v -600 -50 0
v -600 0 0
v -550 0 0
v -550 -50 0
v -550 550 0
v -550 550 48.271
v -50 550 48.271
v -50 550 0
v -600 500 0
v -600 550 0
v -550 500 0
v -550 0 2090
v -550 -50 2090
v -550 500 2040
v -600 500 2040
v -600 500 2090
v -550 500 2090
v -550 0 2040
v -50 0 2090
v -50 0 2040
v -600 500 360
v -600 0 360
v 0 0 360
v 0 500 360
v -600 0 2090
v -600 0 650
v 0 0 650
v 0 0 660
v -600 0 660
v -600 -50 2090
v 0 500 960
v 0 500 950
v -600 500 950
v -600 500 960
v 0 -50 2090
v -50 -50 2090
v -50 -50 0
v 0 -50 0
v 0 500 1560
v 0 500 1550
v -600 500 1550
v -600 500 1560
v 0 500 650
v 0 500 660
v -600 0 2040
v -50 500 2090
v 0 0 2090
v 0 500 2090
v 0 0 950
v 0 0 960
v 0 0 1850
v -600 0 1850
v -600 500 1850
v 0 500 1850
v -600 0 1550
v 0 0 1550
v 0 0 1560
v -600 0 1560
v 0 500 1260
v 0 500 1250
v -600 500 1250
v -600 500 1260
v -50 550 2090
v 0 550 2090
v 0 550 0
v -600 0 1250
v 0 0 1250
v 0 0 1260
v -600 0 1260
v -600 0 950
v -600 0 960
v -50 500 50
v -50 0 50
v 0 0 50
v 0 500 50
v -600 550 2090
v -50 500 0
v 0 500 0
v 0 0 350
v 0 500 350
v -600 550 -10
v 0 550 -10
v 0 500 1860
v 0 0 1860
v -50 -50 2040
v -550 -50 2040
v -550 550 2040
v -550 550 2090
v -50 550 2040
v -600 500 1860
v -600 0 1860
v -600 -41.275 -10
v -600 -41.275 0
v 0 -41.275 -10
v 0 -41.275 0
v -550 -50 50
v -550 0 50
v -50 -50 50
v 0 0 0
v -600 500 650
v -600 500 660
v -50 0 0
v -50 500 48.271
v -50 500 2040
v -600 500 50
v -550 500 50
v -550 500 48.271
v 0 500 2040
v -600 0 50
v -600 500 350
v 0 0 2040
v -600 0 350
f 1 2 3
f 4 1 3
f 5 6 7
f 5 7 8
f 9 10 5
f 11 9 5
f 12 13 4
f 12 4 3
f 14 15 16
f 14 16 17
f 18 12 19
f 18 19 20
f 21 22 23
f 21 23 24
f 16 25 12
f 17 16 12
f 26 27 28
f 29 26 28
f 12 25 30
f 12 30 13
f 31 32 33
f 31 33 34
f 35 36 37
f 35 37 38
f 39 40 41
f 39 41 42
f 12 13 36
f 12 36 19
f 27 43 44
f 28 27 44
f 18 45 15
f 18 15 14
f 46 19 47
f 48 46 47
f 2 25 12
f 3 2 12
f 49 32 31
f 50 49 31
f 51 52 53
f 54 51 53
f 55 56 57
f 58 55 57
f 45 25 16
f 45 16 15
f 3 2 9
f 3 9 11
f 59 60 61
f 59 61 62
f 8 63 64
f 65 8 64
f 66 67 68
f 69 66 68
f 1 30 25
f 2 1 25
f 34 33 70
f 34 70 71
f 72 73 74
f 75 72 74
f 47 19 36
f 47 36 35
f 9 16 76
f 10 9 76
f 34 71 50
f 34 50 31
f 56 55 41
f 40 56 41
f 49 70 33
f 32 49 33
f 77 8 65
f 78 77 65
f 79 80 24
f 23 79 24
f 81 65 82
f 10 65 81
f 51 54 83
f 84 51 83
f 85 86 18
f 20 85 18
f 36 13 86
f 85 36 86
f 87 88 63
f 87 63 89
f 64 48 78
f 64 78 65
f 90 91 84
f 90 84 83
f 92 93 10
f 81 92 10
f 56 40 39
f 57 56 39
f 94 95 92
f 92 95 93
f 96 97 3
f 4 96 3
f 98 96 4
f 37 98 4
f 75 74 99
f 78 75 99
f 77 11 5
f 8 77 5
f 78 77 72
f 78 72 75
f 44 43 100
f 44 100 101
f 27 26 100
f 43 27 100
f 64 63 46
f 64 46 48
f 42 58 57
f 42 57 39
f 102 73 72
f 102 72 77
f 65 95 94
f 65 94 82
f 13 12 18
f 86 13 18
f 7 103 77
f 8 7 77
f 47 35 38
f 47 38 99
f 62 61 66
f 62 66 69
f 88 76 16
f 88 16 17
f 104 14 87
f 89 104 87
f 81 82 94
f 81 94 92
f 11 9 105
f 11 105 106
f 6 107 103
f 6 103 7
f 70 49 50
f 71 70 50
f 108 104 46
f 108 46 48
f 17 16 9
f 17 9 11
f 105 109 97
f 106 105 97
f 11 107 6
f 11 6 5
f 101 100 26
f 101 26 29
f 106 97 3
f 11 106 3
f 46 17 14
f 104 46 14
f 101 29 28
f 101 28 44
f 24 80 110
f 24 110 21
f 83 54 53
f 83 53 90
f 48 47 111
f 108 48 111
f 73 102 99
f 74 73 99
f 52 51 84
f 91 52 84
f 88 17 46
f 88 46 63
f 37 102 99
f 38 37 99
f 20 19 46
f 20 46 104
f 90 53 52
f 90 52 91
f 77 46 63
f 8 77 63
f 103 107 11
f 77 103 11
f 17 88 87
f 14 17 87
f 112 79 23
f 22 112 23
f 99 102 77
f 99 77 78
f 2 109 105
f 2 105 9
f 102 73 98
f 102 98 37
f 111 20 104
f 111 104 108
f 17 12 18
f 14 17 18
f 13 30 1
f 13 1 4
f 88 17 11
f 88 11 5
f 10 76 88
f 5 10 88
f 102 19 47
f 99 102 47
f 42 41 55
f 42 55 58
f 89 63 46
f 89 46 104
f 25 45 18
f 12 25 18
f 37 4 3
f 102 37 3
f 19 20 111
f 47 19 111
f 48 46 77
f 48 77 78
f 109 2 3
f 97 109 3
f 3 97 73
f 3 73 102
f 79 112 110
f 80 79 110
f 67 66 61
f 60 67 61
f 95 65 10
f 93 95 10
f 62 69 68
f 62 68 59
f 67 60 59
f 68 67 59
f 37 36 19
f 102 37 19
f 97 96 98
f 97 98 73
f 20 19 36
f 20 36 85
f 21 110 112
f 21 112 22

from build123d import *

# Parameters (mm, degrees)
SKETCH1_W             = 50
SKETCH1_H             = 50
BOSS_EXTRUDE1_DEPTH   = 2090
BOSS_EXTRUDE1_2_DEPTH = 2090
BOSS_EXTRUDE1_3_DEPTH = 2090
BOSS_EXTRUDE1_4_DEPTH = 2090
SKETCH2_W             = 50
SKETCH2_H             = 50
BOSS_EXTRUDE2_DEPTH   = 500
BOSS_EXTRUDE2_2_DEPTH = 500
BOSS_EXTRUDE2_3_DEPTH = 500
BOSS_EXTRUDE2_4_DEPTH = 500
SKETCH3_W             = 50
SKETCH3_H             = 50
BOSS_EXTRUDE3_DEPTH   = 500
BOSS_EXTRUDE3_2_DEPTH = 500
SKETCH3_W_2           = 48.270716069
BOSS_EXTRUDE3_3_DEPTH = 500
BOSS_EXTRUDE3_4_DEPTH = 500
SKETCH5_W             = 10
SKETCH5_H             = 500
BOSS_EXTRUDE4_DEPTH   = 600
BOSS_EXTRUDE4_2_DEPTH = 600
BOSS_EXTRUDE4_3_DEPTH = 600
BOSS_EXTRUDE4_4_DEPTH = 600
BOSS_EXTRUDE4_5_DEPTH = 600
BOSS_EXTRUDE4_6_DEPTH = 600
SKETCH6_W             = 600
SKETCH6_H             = 591.274599244
BOSS_EXTRUDE5_DEPTH   = 10


with BuildPart() as part:
    # Sketch1 → Boss-Extrude1 (new body)
    with BuildSketch(Plane.XY):
        with Locations((-575, 525)):
            Rectangle(SKETCH1_W, SKETCH1_H)
    extrude(amount=BOSS_EXTRUDE1_DEPTH)


with BuildPart() as body_2:
    # Sketch1 → Boss-Extrude1 2 (new body)
    with BuildSketch(Plane.XY):
        with Locations((-25, -25)):
            Rectangle(SKETCH1_W, SKETCH1_H)
    extrude(amount=BOSS_EXTRUDE1_2_DEPTH)


with BuildPart() as body_3:
    # Sketch1 → Boss-Extrude1 3 (new body)
    with BuildSketch(Plane.XY):
        with Locations((-575, -25)):
            Rectangle(SKETCH1_W, SKETCH1_H)
    extrude(amount=BOSS_EXTRUDE1_3_DEPTH)


with BuildPart() as body_4:
    # Sketch1 → Boss-Extrude1 4 (new body)
    with BuildSketch(Plane.XY):
        with Locations((-25, 525)):
            Rectangle(SKETCH1_W, SKETCH1_H)
    extrude(amount=BOSS_EXTRUDE1_4_DEPTH)


with BuildPart() as body_5:
    # Sketch2 → Boss-Extrude2 (new body)
    with BuildSketch(Plane(origin=(0, 0, 0), x_dir=(1, 0, 0), z_dir=(0, 1, 0))):
        with Locations((-575, -25)):
            Rectangle(SKETCH2_W, SKETCH2_H)
    extrude(amount=BOSS_EXTRUDE2_DEPTH)


with BuildPart() as body_6:
    # Sketch2 → Boss-Extrude2 2 (new body)
    with BuildSketch(Plane(origin=(0, 0, 0), x_dir=(1, 0, 0), z_dir=(0, 1, 0))):
        with Locations((-25, -25)):
            Rectangle(SKETCH2_W, SKETCH2_H)
    extrude(amount=BOSS_EXTRUDE2_2_DEPTH)


with BuildPart() as body_7:
    # Sketch2 → Boss-Extrude2 3 (new body)
    with BuildSketch(Plane(origin=(0, 0, 0), x_dir=(1, 0, 0), z_dir=(0, 1, 0))):
        with Locations((-575, -2065)):
            Rectangle(SKETCH2_W, SKETCH2_H)
    extrude(amount=BOSS_EXTRUDE2_3_DEPTH)


with BuildPart() as body_8:
    # Sketch2 → Boss-Extrude2 4 (new body)
    with BuildSketch(Plane(origin=(0, 0, 0), x_dir=(1, 0, 0), z_dir=(0, 1, 0))):
        with Locations((-25, -2065)):
            Rectangle(SKETCH2_W, SKETCH2_H)
    extrude(amount=BOSS_EXTRUDE2_4_DEPTH)


with BuildPart() as body_9:
    # Sketch3 → Boss-Extrude3 (new body)
    with BuildSketch(Plane(origin=(-550, 0, 0), x_dir=(0, 0, -1), z_dir=(1, 0, 0))):
        with Locations((-2065, 525)):
            Rectangle(SKETCH3_W, SKETCH3_H)
    extrude(amount=BOSS_EXTRUDE3_DEPTH)


with BuildPart() as body_10:
    # Sketch3 → Boss-Extrude3 2 (new body)
    with BuildSketch(Plane(origin=(-550, 0, 0), x_dir=(0, 0, -1), z_dir=(1, 0, 0))):
        with Locations((-2065, -25)):
            Rectangle(SKETCH3_W, SKETCH3_H)
    extrude(amount=BOSS_EXTRUDE3_2_DEPTH)


with BuildPart() as body_11:
    # Sketch3 → Boss-Extrude3 3 (new body)
    with BuildSketch(Plane(origin=(-550, 0, 0), x_dir=(0, 0, -1), z_dir=(1, 0, 0))):
        with Locations((-24.135358035, 525)):
            Rectangle(SKETCH3_W_2, SKETCH3_H)
    extrude(amount=BOSS_EXTRUDE3_3_DEPTH)


with BuildPart() as body_12:
    # Sketch3 → Boss-Extrude3 4 (new body)
    with BuildSketch(Plane(origin=(-550, 0, 0), x_dir=(0, 0, -1), z_dir=(1, 0, 0))):
        with Locations((-25, -25)):
            Rectangle(SKETCH3_W, SKETCH3_H)
    extrude(amount=BOSS_EXTRUDE3_4_DEPTH)


with BuildPart() as body_13:
    # Sketch5 → Boss-Extrude4 (new body)
    with BuildSketch(Plane.ZY.offset(600)):
        with Locations((355, 250)):
            Rectangle(SKETCH5_W, SKETCH5_H)
    extrude(amount=-BOSS_EXTRUDE4_DEPTH)


with BuildPart() as body_14:
    # Sketch5 → Boss-Extrude4 2 (new body)
    with BuildSketch(Plane.ZY.offset(600)):
        with Locations((655, 250)):
            Rectangle(SKETCH5_W, SKETCH5_H)
    extrude(amount=-BOSS_EXTRUDE4_2_DEPTH)


with BuildPart() as body_15:
    # Sketch5 → Boss-Extrude4 3 (new body)
    with BuildSketch(Plane.ZY.offset(600)):
        with Locations((955, 250)):
            Rectangle(SKETCH5_W, SKETCH5_H)
    extrude(amount=-BOSS_EXTRUDE4_3_DEPTH)


with BuildPart() as body_16:
    # Sketch5 → Boss-Extrude4 4 (new body)
    with BuildSketch(Plane.ZY.offset(600)):
        with Locations((1255, 250)):
            Rectangle(SKETCH5_W, SKETCH5_H)
    extrude(amount=-BOSS_EXTRUDE4_4_DEPTH)


with BuildPart() as body_17:
    # Sketch5 → Boss-Extrude4 5 (new body)
    with BuildSketch(Plane.ZY.offset(600)):
        with Locations((1555, 250)):
            Rectangle(SKETCH5_W, SKETCH5_H)
    extrude(amount=-BOSS_EXTRUDE4_5_DEPTH)


with BuildPart() as body_18:
    # Sketch5 → Boss-Extrude4 6 (new body)
    with BuildSketch(Plane.ZY.offset(600)):
        with Locations((1855, 250)):
            Rectangle(SKETCH5_W, SKETCH5_H)
    extrude(amount=-BOSS_EXTRUDE4_6_DEPTH)


with BuildPart() as body_19:
    # Sketch6 → Boss-Extrude5 (new body)
    with BuildSketch(Plane(origin=(0, 0, 0), x_dir=(-1, 0, 0), z_dir=(0, 0, -1))):
        with Locations((300, 254.362700378)):
            Rectangle(SKETCH6_W, SKETCH6_H)
    extrude(amount=BOSS_EXTRUDE5_DEPTH)


solid = Compound([part.part, body_2.part, body_3.part, body_4.part, body_5.part, body_6.part, body_7.part, body_8.part, body_9.part, body_10.part, body_11.part, body_12.part, body_13.part, body_14.part, body_15.part, body_16.part, body_17.part, body_18.part, body_19.part])
